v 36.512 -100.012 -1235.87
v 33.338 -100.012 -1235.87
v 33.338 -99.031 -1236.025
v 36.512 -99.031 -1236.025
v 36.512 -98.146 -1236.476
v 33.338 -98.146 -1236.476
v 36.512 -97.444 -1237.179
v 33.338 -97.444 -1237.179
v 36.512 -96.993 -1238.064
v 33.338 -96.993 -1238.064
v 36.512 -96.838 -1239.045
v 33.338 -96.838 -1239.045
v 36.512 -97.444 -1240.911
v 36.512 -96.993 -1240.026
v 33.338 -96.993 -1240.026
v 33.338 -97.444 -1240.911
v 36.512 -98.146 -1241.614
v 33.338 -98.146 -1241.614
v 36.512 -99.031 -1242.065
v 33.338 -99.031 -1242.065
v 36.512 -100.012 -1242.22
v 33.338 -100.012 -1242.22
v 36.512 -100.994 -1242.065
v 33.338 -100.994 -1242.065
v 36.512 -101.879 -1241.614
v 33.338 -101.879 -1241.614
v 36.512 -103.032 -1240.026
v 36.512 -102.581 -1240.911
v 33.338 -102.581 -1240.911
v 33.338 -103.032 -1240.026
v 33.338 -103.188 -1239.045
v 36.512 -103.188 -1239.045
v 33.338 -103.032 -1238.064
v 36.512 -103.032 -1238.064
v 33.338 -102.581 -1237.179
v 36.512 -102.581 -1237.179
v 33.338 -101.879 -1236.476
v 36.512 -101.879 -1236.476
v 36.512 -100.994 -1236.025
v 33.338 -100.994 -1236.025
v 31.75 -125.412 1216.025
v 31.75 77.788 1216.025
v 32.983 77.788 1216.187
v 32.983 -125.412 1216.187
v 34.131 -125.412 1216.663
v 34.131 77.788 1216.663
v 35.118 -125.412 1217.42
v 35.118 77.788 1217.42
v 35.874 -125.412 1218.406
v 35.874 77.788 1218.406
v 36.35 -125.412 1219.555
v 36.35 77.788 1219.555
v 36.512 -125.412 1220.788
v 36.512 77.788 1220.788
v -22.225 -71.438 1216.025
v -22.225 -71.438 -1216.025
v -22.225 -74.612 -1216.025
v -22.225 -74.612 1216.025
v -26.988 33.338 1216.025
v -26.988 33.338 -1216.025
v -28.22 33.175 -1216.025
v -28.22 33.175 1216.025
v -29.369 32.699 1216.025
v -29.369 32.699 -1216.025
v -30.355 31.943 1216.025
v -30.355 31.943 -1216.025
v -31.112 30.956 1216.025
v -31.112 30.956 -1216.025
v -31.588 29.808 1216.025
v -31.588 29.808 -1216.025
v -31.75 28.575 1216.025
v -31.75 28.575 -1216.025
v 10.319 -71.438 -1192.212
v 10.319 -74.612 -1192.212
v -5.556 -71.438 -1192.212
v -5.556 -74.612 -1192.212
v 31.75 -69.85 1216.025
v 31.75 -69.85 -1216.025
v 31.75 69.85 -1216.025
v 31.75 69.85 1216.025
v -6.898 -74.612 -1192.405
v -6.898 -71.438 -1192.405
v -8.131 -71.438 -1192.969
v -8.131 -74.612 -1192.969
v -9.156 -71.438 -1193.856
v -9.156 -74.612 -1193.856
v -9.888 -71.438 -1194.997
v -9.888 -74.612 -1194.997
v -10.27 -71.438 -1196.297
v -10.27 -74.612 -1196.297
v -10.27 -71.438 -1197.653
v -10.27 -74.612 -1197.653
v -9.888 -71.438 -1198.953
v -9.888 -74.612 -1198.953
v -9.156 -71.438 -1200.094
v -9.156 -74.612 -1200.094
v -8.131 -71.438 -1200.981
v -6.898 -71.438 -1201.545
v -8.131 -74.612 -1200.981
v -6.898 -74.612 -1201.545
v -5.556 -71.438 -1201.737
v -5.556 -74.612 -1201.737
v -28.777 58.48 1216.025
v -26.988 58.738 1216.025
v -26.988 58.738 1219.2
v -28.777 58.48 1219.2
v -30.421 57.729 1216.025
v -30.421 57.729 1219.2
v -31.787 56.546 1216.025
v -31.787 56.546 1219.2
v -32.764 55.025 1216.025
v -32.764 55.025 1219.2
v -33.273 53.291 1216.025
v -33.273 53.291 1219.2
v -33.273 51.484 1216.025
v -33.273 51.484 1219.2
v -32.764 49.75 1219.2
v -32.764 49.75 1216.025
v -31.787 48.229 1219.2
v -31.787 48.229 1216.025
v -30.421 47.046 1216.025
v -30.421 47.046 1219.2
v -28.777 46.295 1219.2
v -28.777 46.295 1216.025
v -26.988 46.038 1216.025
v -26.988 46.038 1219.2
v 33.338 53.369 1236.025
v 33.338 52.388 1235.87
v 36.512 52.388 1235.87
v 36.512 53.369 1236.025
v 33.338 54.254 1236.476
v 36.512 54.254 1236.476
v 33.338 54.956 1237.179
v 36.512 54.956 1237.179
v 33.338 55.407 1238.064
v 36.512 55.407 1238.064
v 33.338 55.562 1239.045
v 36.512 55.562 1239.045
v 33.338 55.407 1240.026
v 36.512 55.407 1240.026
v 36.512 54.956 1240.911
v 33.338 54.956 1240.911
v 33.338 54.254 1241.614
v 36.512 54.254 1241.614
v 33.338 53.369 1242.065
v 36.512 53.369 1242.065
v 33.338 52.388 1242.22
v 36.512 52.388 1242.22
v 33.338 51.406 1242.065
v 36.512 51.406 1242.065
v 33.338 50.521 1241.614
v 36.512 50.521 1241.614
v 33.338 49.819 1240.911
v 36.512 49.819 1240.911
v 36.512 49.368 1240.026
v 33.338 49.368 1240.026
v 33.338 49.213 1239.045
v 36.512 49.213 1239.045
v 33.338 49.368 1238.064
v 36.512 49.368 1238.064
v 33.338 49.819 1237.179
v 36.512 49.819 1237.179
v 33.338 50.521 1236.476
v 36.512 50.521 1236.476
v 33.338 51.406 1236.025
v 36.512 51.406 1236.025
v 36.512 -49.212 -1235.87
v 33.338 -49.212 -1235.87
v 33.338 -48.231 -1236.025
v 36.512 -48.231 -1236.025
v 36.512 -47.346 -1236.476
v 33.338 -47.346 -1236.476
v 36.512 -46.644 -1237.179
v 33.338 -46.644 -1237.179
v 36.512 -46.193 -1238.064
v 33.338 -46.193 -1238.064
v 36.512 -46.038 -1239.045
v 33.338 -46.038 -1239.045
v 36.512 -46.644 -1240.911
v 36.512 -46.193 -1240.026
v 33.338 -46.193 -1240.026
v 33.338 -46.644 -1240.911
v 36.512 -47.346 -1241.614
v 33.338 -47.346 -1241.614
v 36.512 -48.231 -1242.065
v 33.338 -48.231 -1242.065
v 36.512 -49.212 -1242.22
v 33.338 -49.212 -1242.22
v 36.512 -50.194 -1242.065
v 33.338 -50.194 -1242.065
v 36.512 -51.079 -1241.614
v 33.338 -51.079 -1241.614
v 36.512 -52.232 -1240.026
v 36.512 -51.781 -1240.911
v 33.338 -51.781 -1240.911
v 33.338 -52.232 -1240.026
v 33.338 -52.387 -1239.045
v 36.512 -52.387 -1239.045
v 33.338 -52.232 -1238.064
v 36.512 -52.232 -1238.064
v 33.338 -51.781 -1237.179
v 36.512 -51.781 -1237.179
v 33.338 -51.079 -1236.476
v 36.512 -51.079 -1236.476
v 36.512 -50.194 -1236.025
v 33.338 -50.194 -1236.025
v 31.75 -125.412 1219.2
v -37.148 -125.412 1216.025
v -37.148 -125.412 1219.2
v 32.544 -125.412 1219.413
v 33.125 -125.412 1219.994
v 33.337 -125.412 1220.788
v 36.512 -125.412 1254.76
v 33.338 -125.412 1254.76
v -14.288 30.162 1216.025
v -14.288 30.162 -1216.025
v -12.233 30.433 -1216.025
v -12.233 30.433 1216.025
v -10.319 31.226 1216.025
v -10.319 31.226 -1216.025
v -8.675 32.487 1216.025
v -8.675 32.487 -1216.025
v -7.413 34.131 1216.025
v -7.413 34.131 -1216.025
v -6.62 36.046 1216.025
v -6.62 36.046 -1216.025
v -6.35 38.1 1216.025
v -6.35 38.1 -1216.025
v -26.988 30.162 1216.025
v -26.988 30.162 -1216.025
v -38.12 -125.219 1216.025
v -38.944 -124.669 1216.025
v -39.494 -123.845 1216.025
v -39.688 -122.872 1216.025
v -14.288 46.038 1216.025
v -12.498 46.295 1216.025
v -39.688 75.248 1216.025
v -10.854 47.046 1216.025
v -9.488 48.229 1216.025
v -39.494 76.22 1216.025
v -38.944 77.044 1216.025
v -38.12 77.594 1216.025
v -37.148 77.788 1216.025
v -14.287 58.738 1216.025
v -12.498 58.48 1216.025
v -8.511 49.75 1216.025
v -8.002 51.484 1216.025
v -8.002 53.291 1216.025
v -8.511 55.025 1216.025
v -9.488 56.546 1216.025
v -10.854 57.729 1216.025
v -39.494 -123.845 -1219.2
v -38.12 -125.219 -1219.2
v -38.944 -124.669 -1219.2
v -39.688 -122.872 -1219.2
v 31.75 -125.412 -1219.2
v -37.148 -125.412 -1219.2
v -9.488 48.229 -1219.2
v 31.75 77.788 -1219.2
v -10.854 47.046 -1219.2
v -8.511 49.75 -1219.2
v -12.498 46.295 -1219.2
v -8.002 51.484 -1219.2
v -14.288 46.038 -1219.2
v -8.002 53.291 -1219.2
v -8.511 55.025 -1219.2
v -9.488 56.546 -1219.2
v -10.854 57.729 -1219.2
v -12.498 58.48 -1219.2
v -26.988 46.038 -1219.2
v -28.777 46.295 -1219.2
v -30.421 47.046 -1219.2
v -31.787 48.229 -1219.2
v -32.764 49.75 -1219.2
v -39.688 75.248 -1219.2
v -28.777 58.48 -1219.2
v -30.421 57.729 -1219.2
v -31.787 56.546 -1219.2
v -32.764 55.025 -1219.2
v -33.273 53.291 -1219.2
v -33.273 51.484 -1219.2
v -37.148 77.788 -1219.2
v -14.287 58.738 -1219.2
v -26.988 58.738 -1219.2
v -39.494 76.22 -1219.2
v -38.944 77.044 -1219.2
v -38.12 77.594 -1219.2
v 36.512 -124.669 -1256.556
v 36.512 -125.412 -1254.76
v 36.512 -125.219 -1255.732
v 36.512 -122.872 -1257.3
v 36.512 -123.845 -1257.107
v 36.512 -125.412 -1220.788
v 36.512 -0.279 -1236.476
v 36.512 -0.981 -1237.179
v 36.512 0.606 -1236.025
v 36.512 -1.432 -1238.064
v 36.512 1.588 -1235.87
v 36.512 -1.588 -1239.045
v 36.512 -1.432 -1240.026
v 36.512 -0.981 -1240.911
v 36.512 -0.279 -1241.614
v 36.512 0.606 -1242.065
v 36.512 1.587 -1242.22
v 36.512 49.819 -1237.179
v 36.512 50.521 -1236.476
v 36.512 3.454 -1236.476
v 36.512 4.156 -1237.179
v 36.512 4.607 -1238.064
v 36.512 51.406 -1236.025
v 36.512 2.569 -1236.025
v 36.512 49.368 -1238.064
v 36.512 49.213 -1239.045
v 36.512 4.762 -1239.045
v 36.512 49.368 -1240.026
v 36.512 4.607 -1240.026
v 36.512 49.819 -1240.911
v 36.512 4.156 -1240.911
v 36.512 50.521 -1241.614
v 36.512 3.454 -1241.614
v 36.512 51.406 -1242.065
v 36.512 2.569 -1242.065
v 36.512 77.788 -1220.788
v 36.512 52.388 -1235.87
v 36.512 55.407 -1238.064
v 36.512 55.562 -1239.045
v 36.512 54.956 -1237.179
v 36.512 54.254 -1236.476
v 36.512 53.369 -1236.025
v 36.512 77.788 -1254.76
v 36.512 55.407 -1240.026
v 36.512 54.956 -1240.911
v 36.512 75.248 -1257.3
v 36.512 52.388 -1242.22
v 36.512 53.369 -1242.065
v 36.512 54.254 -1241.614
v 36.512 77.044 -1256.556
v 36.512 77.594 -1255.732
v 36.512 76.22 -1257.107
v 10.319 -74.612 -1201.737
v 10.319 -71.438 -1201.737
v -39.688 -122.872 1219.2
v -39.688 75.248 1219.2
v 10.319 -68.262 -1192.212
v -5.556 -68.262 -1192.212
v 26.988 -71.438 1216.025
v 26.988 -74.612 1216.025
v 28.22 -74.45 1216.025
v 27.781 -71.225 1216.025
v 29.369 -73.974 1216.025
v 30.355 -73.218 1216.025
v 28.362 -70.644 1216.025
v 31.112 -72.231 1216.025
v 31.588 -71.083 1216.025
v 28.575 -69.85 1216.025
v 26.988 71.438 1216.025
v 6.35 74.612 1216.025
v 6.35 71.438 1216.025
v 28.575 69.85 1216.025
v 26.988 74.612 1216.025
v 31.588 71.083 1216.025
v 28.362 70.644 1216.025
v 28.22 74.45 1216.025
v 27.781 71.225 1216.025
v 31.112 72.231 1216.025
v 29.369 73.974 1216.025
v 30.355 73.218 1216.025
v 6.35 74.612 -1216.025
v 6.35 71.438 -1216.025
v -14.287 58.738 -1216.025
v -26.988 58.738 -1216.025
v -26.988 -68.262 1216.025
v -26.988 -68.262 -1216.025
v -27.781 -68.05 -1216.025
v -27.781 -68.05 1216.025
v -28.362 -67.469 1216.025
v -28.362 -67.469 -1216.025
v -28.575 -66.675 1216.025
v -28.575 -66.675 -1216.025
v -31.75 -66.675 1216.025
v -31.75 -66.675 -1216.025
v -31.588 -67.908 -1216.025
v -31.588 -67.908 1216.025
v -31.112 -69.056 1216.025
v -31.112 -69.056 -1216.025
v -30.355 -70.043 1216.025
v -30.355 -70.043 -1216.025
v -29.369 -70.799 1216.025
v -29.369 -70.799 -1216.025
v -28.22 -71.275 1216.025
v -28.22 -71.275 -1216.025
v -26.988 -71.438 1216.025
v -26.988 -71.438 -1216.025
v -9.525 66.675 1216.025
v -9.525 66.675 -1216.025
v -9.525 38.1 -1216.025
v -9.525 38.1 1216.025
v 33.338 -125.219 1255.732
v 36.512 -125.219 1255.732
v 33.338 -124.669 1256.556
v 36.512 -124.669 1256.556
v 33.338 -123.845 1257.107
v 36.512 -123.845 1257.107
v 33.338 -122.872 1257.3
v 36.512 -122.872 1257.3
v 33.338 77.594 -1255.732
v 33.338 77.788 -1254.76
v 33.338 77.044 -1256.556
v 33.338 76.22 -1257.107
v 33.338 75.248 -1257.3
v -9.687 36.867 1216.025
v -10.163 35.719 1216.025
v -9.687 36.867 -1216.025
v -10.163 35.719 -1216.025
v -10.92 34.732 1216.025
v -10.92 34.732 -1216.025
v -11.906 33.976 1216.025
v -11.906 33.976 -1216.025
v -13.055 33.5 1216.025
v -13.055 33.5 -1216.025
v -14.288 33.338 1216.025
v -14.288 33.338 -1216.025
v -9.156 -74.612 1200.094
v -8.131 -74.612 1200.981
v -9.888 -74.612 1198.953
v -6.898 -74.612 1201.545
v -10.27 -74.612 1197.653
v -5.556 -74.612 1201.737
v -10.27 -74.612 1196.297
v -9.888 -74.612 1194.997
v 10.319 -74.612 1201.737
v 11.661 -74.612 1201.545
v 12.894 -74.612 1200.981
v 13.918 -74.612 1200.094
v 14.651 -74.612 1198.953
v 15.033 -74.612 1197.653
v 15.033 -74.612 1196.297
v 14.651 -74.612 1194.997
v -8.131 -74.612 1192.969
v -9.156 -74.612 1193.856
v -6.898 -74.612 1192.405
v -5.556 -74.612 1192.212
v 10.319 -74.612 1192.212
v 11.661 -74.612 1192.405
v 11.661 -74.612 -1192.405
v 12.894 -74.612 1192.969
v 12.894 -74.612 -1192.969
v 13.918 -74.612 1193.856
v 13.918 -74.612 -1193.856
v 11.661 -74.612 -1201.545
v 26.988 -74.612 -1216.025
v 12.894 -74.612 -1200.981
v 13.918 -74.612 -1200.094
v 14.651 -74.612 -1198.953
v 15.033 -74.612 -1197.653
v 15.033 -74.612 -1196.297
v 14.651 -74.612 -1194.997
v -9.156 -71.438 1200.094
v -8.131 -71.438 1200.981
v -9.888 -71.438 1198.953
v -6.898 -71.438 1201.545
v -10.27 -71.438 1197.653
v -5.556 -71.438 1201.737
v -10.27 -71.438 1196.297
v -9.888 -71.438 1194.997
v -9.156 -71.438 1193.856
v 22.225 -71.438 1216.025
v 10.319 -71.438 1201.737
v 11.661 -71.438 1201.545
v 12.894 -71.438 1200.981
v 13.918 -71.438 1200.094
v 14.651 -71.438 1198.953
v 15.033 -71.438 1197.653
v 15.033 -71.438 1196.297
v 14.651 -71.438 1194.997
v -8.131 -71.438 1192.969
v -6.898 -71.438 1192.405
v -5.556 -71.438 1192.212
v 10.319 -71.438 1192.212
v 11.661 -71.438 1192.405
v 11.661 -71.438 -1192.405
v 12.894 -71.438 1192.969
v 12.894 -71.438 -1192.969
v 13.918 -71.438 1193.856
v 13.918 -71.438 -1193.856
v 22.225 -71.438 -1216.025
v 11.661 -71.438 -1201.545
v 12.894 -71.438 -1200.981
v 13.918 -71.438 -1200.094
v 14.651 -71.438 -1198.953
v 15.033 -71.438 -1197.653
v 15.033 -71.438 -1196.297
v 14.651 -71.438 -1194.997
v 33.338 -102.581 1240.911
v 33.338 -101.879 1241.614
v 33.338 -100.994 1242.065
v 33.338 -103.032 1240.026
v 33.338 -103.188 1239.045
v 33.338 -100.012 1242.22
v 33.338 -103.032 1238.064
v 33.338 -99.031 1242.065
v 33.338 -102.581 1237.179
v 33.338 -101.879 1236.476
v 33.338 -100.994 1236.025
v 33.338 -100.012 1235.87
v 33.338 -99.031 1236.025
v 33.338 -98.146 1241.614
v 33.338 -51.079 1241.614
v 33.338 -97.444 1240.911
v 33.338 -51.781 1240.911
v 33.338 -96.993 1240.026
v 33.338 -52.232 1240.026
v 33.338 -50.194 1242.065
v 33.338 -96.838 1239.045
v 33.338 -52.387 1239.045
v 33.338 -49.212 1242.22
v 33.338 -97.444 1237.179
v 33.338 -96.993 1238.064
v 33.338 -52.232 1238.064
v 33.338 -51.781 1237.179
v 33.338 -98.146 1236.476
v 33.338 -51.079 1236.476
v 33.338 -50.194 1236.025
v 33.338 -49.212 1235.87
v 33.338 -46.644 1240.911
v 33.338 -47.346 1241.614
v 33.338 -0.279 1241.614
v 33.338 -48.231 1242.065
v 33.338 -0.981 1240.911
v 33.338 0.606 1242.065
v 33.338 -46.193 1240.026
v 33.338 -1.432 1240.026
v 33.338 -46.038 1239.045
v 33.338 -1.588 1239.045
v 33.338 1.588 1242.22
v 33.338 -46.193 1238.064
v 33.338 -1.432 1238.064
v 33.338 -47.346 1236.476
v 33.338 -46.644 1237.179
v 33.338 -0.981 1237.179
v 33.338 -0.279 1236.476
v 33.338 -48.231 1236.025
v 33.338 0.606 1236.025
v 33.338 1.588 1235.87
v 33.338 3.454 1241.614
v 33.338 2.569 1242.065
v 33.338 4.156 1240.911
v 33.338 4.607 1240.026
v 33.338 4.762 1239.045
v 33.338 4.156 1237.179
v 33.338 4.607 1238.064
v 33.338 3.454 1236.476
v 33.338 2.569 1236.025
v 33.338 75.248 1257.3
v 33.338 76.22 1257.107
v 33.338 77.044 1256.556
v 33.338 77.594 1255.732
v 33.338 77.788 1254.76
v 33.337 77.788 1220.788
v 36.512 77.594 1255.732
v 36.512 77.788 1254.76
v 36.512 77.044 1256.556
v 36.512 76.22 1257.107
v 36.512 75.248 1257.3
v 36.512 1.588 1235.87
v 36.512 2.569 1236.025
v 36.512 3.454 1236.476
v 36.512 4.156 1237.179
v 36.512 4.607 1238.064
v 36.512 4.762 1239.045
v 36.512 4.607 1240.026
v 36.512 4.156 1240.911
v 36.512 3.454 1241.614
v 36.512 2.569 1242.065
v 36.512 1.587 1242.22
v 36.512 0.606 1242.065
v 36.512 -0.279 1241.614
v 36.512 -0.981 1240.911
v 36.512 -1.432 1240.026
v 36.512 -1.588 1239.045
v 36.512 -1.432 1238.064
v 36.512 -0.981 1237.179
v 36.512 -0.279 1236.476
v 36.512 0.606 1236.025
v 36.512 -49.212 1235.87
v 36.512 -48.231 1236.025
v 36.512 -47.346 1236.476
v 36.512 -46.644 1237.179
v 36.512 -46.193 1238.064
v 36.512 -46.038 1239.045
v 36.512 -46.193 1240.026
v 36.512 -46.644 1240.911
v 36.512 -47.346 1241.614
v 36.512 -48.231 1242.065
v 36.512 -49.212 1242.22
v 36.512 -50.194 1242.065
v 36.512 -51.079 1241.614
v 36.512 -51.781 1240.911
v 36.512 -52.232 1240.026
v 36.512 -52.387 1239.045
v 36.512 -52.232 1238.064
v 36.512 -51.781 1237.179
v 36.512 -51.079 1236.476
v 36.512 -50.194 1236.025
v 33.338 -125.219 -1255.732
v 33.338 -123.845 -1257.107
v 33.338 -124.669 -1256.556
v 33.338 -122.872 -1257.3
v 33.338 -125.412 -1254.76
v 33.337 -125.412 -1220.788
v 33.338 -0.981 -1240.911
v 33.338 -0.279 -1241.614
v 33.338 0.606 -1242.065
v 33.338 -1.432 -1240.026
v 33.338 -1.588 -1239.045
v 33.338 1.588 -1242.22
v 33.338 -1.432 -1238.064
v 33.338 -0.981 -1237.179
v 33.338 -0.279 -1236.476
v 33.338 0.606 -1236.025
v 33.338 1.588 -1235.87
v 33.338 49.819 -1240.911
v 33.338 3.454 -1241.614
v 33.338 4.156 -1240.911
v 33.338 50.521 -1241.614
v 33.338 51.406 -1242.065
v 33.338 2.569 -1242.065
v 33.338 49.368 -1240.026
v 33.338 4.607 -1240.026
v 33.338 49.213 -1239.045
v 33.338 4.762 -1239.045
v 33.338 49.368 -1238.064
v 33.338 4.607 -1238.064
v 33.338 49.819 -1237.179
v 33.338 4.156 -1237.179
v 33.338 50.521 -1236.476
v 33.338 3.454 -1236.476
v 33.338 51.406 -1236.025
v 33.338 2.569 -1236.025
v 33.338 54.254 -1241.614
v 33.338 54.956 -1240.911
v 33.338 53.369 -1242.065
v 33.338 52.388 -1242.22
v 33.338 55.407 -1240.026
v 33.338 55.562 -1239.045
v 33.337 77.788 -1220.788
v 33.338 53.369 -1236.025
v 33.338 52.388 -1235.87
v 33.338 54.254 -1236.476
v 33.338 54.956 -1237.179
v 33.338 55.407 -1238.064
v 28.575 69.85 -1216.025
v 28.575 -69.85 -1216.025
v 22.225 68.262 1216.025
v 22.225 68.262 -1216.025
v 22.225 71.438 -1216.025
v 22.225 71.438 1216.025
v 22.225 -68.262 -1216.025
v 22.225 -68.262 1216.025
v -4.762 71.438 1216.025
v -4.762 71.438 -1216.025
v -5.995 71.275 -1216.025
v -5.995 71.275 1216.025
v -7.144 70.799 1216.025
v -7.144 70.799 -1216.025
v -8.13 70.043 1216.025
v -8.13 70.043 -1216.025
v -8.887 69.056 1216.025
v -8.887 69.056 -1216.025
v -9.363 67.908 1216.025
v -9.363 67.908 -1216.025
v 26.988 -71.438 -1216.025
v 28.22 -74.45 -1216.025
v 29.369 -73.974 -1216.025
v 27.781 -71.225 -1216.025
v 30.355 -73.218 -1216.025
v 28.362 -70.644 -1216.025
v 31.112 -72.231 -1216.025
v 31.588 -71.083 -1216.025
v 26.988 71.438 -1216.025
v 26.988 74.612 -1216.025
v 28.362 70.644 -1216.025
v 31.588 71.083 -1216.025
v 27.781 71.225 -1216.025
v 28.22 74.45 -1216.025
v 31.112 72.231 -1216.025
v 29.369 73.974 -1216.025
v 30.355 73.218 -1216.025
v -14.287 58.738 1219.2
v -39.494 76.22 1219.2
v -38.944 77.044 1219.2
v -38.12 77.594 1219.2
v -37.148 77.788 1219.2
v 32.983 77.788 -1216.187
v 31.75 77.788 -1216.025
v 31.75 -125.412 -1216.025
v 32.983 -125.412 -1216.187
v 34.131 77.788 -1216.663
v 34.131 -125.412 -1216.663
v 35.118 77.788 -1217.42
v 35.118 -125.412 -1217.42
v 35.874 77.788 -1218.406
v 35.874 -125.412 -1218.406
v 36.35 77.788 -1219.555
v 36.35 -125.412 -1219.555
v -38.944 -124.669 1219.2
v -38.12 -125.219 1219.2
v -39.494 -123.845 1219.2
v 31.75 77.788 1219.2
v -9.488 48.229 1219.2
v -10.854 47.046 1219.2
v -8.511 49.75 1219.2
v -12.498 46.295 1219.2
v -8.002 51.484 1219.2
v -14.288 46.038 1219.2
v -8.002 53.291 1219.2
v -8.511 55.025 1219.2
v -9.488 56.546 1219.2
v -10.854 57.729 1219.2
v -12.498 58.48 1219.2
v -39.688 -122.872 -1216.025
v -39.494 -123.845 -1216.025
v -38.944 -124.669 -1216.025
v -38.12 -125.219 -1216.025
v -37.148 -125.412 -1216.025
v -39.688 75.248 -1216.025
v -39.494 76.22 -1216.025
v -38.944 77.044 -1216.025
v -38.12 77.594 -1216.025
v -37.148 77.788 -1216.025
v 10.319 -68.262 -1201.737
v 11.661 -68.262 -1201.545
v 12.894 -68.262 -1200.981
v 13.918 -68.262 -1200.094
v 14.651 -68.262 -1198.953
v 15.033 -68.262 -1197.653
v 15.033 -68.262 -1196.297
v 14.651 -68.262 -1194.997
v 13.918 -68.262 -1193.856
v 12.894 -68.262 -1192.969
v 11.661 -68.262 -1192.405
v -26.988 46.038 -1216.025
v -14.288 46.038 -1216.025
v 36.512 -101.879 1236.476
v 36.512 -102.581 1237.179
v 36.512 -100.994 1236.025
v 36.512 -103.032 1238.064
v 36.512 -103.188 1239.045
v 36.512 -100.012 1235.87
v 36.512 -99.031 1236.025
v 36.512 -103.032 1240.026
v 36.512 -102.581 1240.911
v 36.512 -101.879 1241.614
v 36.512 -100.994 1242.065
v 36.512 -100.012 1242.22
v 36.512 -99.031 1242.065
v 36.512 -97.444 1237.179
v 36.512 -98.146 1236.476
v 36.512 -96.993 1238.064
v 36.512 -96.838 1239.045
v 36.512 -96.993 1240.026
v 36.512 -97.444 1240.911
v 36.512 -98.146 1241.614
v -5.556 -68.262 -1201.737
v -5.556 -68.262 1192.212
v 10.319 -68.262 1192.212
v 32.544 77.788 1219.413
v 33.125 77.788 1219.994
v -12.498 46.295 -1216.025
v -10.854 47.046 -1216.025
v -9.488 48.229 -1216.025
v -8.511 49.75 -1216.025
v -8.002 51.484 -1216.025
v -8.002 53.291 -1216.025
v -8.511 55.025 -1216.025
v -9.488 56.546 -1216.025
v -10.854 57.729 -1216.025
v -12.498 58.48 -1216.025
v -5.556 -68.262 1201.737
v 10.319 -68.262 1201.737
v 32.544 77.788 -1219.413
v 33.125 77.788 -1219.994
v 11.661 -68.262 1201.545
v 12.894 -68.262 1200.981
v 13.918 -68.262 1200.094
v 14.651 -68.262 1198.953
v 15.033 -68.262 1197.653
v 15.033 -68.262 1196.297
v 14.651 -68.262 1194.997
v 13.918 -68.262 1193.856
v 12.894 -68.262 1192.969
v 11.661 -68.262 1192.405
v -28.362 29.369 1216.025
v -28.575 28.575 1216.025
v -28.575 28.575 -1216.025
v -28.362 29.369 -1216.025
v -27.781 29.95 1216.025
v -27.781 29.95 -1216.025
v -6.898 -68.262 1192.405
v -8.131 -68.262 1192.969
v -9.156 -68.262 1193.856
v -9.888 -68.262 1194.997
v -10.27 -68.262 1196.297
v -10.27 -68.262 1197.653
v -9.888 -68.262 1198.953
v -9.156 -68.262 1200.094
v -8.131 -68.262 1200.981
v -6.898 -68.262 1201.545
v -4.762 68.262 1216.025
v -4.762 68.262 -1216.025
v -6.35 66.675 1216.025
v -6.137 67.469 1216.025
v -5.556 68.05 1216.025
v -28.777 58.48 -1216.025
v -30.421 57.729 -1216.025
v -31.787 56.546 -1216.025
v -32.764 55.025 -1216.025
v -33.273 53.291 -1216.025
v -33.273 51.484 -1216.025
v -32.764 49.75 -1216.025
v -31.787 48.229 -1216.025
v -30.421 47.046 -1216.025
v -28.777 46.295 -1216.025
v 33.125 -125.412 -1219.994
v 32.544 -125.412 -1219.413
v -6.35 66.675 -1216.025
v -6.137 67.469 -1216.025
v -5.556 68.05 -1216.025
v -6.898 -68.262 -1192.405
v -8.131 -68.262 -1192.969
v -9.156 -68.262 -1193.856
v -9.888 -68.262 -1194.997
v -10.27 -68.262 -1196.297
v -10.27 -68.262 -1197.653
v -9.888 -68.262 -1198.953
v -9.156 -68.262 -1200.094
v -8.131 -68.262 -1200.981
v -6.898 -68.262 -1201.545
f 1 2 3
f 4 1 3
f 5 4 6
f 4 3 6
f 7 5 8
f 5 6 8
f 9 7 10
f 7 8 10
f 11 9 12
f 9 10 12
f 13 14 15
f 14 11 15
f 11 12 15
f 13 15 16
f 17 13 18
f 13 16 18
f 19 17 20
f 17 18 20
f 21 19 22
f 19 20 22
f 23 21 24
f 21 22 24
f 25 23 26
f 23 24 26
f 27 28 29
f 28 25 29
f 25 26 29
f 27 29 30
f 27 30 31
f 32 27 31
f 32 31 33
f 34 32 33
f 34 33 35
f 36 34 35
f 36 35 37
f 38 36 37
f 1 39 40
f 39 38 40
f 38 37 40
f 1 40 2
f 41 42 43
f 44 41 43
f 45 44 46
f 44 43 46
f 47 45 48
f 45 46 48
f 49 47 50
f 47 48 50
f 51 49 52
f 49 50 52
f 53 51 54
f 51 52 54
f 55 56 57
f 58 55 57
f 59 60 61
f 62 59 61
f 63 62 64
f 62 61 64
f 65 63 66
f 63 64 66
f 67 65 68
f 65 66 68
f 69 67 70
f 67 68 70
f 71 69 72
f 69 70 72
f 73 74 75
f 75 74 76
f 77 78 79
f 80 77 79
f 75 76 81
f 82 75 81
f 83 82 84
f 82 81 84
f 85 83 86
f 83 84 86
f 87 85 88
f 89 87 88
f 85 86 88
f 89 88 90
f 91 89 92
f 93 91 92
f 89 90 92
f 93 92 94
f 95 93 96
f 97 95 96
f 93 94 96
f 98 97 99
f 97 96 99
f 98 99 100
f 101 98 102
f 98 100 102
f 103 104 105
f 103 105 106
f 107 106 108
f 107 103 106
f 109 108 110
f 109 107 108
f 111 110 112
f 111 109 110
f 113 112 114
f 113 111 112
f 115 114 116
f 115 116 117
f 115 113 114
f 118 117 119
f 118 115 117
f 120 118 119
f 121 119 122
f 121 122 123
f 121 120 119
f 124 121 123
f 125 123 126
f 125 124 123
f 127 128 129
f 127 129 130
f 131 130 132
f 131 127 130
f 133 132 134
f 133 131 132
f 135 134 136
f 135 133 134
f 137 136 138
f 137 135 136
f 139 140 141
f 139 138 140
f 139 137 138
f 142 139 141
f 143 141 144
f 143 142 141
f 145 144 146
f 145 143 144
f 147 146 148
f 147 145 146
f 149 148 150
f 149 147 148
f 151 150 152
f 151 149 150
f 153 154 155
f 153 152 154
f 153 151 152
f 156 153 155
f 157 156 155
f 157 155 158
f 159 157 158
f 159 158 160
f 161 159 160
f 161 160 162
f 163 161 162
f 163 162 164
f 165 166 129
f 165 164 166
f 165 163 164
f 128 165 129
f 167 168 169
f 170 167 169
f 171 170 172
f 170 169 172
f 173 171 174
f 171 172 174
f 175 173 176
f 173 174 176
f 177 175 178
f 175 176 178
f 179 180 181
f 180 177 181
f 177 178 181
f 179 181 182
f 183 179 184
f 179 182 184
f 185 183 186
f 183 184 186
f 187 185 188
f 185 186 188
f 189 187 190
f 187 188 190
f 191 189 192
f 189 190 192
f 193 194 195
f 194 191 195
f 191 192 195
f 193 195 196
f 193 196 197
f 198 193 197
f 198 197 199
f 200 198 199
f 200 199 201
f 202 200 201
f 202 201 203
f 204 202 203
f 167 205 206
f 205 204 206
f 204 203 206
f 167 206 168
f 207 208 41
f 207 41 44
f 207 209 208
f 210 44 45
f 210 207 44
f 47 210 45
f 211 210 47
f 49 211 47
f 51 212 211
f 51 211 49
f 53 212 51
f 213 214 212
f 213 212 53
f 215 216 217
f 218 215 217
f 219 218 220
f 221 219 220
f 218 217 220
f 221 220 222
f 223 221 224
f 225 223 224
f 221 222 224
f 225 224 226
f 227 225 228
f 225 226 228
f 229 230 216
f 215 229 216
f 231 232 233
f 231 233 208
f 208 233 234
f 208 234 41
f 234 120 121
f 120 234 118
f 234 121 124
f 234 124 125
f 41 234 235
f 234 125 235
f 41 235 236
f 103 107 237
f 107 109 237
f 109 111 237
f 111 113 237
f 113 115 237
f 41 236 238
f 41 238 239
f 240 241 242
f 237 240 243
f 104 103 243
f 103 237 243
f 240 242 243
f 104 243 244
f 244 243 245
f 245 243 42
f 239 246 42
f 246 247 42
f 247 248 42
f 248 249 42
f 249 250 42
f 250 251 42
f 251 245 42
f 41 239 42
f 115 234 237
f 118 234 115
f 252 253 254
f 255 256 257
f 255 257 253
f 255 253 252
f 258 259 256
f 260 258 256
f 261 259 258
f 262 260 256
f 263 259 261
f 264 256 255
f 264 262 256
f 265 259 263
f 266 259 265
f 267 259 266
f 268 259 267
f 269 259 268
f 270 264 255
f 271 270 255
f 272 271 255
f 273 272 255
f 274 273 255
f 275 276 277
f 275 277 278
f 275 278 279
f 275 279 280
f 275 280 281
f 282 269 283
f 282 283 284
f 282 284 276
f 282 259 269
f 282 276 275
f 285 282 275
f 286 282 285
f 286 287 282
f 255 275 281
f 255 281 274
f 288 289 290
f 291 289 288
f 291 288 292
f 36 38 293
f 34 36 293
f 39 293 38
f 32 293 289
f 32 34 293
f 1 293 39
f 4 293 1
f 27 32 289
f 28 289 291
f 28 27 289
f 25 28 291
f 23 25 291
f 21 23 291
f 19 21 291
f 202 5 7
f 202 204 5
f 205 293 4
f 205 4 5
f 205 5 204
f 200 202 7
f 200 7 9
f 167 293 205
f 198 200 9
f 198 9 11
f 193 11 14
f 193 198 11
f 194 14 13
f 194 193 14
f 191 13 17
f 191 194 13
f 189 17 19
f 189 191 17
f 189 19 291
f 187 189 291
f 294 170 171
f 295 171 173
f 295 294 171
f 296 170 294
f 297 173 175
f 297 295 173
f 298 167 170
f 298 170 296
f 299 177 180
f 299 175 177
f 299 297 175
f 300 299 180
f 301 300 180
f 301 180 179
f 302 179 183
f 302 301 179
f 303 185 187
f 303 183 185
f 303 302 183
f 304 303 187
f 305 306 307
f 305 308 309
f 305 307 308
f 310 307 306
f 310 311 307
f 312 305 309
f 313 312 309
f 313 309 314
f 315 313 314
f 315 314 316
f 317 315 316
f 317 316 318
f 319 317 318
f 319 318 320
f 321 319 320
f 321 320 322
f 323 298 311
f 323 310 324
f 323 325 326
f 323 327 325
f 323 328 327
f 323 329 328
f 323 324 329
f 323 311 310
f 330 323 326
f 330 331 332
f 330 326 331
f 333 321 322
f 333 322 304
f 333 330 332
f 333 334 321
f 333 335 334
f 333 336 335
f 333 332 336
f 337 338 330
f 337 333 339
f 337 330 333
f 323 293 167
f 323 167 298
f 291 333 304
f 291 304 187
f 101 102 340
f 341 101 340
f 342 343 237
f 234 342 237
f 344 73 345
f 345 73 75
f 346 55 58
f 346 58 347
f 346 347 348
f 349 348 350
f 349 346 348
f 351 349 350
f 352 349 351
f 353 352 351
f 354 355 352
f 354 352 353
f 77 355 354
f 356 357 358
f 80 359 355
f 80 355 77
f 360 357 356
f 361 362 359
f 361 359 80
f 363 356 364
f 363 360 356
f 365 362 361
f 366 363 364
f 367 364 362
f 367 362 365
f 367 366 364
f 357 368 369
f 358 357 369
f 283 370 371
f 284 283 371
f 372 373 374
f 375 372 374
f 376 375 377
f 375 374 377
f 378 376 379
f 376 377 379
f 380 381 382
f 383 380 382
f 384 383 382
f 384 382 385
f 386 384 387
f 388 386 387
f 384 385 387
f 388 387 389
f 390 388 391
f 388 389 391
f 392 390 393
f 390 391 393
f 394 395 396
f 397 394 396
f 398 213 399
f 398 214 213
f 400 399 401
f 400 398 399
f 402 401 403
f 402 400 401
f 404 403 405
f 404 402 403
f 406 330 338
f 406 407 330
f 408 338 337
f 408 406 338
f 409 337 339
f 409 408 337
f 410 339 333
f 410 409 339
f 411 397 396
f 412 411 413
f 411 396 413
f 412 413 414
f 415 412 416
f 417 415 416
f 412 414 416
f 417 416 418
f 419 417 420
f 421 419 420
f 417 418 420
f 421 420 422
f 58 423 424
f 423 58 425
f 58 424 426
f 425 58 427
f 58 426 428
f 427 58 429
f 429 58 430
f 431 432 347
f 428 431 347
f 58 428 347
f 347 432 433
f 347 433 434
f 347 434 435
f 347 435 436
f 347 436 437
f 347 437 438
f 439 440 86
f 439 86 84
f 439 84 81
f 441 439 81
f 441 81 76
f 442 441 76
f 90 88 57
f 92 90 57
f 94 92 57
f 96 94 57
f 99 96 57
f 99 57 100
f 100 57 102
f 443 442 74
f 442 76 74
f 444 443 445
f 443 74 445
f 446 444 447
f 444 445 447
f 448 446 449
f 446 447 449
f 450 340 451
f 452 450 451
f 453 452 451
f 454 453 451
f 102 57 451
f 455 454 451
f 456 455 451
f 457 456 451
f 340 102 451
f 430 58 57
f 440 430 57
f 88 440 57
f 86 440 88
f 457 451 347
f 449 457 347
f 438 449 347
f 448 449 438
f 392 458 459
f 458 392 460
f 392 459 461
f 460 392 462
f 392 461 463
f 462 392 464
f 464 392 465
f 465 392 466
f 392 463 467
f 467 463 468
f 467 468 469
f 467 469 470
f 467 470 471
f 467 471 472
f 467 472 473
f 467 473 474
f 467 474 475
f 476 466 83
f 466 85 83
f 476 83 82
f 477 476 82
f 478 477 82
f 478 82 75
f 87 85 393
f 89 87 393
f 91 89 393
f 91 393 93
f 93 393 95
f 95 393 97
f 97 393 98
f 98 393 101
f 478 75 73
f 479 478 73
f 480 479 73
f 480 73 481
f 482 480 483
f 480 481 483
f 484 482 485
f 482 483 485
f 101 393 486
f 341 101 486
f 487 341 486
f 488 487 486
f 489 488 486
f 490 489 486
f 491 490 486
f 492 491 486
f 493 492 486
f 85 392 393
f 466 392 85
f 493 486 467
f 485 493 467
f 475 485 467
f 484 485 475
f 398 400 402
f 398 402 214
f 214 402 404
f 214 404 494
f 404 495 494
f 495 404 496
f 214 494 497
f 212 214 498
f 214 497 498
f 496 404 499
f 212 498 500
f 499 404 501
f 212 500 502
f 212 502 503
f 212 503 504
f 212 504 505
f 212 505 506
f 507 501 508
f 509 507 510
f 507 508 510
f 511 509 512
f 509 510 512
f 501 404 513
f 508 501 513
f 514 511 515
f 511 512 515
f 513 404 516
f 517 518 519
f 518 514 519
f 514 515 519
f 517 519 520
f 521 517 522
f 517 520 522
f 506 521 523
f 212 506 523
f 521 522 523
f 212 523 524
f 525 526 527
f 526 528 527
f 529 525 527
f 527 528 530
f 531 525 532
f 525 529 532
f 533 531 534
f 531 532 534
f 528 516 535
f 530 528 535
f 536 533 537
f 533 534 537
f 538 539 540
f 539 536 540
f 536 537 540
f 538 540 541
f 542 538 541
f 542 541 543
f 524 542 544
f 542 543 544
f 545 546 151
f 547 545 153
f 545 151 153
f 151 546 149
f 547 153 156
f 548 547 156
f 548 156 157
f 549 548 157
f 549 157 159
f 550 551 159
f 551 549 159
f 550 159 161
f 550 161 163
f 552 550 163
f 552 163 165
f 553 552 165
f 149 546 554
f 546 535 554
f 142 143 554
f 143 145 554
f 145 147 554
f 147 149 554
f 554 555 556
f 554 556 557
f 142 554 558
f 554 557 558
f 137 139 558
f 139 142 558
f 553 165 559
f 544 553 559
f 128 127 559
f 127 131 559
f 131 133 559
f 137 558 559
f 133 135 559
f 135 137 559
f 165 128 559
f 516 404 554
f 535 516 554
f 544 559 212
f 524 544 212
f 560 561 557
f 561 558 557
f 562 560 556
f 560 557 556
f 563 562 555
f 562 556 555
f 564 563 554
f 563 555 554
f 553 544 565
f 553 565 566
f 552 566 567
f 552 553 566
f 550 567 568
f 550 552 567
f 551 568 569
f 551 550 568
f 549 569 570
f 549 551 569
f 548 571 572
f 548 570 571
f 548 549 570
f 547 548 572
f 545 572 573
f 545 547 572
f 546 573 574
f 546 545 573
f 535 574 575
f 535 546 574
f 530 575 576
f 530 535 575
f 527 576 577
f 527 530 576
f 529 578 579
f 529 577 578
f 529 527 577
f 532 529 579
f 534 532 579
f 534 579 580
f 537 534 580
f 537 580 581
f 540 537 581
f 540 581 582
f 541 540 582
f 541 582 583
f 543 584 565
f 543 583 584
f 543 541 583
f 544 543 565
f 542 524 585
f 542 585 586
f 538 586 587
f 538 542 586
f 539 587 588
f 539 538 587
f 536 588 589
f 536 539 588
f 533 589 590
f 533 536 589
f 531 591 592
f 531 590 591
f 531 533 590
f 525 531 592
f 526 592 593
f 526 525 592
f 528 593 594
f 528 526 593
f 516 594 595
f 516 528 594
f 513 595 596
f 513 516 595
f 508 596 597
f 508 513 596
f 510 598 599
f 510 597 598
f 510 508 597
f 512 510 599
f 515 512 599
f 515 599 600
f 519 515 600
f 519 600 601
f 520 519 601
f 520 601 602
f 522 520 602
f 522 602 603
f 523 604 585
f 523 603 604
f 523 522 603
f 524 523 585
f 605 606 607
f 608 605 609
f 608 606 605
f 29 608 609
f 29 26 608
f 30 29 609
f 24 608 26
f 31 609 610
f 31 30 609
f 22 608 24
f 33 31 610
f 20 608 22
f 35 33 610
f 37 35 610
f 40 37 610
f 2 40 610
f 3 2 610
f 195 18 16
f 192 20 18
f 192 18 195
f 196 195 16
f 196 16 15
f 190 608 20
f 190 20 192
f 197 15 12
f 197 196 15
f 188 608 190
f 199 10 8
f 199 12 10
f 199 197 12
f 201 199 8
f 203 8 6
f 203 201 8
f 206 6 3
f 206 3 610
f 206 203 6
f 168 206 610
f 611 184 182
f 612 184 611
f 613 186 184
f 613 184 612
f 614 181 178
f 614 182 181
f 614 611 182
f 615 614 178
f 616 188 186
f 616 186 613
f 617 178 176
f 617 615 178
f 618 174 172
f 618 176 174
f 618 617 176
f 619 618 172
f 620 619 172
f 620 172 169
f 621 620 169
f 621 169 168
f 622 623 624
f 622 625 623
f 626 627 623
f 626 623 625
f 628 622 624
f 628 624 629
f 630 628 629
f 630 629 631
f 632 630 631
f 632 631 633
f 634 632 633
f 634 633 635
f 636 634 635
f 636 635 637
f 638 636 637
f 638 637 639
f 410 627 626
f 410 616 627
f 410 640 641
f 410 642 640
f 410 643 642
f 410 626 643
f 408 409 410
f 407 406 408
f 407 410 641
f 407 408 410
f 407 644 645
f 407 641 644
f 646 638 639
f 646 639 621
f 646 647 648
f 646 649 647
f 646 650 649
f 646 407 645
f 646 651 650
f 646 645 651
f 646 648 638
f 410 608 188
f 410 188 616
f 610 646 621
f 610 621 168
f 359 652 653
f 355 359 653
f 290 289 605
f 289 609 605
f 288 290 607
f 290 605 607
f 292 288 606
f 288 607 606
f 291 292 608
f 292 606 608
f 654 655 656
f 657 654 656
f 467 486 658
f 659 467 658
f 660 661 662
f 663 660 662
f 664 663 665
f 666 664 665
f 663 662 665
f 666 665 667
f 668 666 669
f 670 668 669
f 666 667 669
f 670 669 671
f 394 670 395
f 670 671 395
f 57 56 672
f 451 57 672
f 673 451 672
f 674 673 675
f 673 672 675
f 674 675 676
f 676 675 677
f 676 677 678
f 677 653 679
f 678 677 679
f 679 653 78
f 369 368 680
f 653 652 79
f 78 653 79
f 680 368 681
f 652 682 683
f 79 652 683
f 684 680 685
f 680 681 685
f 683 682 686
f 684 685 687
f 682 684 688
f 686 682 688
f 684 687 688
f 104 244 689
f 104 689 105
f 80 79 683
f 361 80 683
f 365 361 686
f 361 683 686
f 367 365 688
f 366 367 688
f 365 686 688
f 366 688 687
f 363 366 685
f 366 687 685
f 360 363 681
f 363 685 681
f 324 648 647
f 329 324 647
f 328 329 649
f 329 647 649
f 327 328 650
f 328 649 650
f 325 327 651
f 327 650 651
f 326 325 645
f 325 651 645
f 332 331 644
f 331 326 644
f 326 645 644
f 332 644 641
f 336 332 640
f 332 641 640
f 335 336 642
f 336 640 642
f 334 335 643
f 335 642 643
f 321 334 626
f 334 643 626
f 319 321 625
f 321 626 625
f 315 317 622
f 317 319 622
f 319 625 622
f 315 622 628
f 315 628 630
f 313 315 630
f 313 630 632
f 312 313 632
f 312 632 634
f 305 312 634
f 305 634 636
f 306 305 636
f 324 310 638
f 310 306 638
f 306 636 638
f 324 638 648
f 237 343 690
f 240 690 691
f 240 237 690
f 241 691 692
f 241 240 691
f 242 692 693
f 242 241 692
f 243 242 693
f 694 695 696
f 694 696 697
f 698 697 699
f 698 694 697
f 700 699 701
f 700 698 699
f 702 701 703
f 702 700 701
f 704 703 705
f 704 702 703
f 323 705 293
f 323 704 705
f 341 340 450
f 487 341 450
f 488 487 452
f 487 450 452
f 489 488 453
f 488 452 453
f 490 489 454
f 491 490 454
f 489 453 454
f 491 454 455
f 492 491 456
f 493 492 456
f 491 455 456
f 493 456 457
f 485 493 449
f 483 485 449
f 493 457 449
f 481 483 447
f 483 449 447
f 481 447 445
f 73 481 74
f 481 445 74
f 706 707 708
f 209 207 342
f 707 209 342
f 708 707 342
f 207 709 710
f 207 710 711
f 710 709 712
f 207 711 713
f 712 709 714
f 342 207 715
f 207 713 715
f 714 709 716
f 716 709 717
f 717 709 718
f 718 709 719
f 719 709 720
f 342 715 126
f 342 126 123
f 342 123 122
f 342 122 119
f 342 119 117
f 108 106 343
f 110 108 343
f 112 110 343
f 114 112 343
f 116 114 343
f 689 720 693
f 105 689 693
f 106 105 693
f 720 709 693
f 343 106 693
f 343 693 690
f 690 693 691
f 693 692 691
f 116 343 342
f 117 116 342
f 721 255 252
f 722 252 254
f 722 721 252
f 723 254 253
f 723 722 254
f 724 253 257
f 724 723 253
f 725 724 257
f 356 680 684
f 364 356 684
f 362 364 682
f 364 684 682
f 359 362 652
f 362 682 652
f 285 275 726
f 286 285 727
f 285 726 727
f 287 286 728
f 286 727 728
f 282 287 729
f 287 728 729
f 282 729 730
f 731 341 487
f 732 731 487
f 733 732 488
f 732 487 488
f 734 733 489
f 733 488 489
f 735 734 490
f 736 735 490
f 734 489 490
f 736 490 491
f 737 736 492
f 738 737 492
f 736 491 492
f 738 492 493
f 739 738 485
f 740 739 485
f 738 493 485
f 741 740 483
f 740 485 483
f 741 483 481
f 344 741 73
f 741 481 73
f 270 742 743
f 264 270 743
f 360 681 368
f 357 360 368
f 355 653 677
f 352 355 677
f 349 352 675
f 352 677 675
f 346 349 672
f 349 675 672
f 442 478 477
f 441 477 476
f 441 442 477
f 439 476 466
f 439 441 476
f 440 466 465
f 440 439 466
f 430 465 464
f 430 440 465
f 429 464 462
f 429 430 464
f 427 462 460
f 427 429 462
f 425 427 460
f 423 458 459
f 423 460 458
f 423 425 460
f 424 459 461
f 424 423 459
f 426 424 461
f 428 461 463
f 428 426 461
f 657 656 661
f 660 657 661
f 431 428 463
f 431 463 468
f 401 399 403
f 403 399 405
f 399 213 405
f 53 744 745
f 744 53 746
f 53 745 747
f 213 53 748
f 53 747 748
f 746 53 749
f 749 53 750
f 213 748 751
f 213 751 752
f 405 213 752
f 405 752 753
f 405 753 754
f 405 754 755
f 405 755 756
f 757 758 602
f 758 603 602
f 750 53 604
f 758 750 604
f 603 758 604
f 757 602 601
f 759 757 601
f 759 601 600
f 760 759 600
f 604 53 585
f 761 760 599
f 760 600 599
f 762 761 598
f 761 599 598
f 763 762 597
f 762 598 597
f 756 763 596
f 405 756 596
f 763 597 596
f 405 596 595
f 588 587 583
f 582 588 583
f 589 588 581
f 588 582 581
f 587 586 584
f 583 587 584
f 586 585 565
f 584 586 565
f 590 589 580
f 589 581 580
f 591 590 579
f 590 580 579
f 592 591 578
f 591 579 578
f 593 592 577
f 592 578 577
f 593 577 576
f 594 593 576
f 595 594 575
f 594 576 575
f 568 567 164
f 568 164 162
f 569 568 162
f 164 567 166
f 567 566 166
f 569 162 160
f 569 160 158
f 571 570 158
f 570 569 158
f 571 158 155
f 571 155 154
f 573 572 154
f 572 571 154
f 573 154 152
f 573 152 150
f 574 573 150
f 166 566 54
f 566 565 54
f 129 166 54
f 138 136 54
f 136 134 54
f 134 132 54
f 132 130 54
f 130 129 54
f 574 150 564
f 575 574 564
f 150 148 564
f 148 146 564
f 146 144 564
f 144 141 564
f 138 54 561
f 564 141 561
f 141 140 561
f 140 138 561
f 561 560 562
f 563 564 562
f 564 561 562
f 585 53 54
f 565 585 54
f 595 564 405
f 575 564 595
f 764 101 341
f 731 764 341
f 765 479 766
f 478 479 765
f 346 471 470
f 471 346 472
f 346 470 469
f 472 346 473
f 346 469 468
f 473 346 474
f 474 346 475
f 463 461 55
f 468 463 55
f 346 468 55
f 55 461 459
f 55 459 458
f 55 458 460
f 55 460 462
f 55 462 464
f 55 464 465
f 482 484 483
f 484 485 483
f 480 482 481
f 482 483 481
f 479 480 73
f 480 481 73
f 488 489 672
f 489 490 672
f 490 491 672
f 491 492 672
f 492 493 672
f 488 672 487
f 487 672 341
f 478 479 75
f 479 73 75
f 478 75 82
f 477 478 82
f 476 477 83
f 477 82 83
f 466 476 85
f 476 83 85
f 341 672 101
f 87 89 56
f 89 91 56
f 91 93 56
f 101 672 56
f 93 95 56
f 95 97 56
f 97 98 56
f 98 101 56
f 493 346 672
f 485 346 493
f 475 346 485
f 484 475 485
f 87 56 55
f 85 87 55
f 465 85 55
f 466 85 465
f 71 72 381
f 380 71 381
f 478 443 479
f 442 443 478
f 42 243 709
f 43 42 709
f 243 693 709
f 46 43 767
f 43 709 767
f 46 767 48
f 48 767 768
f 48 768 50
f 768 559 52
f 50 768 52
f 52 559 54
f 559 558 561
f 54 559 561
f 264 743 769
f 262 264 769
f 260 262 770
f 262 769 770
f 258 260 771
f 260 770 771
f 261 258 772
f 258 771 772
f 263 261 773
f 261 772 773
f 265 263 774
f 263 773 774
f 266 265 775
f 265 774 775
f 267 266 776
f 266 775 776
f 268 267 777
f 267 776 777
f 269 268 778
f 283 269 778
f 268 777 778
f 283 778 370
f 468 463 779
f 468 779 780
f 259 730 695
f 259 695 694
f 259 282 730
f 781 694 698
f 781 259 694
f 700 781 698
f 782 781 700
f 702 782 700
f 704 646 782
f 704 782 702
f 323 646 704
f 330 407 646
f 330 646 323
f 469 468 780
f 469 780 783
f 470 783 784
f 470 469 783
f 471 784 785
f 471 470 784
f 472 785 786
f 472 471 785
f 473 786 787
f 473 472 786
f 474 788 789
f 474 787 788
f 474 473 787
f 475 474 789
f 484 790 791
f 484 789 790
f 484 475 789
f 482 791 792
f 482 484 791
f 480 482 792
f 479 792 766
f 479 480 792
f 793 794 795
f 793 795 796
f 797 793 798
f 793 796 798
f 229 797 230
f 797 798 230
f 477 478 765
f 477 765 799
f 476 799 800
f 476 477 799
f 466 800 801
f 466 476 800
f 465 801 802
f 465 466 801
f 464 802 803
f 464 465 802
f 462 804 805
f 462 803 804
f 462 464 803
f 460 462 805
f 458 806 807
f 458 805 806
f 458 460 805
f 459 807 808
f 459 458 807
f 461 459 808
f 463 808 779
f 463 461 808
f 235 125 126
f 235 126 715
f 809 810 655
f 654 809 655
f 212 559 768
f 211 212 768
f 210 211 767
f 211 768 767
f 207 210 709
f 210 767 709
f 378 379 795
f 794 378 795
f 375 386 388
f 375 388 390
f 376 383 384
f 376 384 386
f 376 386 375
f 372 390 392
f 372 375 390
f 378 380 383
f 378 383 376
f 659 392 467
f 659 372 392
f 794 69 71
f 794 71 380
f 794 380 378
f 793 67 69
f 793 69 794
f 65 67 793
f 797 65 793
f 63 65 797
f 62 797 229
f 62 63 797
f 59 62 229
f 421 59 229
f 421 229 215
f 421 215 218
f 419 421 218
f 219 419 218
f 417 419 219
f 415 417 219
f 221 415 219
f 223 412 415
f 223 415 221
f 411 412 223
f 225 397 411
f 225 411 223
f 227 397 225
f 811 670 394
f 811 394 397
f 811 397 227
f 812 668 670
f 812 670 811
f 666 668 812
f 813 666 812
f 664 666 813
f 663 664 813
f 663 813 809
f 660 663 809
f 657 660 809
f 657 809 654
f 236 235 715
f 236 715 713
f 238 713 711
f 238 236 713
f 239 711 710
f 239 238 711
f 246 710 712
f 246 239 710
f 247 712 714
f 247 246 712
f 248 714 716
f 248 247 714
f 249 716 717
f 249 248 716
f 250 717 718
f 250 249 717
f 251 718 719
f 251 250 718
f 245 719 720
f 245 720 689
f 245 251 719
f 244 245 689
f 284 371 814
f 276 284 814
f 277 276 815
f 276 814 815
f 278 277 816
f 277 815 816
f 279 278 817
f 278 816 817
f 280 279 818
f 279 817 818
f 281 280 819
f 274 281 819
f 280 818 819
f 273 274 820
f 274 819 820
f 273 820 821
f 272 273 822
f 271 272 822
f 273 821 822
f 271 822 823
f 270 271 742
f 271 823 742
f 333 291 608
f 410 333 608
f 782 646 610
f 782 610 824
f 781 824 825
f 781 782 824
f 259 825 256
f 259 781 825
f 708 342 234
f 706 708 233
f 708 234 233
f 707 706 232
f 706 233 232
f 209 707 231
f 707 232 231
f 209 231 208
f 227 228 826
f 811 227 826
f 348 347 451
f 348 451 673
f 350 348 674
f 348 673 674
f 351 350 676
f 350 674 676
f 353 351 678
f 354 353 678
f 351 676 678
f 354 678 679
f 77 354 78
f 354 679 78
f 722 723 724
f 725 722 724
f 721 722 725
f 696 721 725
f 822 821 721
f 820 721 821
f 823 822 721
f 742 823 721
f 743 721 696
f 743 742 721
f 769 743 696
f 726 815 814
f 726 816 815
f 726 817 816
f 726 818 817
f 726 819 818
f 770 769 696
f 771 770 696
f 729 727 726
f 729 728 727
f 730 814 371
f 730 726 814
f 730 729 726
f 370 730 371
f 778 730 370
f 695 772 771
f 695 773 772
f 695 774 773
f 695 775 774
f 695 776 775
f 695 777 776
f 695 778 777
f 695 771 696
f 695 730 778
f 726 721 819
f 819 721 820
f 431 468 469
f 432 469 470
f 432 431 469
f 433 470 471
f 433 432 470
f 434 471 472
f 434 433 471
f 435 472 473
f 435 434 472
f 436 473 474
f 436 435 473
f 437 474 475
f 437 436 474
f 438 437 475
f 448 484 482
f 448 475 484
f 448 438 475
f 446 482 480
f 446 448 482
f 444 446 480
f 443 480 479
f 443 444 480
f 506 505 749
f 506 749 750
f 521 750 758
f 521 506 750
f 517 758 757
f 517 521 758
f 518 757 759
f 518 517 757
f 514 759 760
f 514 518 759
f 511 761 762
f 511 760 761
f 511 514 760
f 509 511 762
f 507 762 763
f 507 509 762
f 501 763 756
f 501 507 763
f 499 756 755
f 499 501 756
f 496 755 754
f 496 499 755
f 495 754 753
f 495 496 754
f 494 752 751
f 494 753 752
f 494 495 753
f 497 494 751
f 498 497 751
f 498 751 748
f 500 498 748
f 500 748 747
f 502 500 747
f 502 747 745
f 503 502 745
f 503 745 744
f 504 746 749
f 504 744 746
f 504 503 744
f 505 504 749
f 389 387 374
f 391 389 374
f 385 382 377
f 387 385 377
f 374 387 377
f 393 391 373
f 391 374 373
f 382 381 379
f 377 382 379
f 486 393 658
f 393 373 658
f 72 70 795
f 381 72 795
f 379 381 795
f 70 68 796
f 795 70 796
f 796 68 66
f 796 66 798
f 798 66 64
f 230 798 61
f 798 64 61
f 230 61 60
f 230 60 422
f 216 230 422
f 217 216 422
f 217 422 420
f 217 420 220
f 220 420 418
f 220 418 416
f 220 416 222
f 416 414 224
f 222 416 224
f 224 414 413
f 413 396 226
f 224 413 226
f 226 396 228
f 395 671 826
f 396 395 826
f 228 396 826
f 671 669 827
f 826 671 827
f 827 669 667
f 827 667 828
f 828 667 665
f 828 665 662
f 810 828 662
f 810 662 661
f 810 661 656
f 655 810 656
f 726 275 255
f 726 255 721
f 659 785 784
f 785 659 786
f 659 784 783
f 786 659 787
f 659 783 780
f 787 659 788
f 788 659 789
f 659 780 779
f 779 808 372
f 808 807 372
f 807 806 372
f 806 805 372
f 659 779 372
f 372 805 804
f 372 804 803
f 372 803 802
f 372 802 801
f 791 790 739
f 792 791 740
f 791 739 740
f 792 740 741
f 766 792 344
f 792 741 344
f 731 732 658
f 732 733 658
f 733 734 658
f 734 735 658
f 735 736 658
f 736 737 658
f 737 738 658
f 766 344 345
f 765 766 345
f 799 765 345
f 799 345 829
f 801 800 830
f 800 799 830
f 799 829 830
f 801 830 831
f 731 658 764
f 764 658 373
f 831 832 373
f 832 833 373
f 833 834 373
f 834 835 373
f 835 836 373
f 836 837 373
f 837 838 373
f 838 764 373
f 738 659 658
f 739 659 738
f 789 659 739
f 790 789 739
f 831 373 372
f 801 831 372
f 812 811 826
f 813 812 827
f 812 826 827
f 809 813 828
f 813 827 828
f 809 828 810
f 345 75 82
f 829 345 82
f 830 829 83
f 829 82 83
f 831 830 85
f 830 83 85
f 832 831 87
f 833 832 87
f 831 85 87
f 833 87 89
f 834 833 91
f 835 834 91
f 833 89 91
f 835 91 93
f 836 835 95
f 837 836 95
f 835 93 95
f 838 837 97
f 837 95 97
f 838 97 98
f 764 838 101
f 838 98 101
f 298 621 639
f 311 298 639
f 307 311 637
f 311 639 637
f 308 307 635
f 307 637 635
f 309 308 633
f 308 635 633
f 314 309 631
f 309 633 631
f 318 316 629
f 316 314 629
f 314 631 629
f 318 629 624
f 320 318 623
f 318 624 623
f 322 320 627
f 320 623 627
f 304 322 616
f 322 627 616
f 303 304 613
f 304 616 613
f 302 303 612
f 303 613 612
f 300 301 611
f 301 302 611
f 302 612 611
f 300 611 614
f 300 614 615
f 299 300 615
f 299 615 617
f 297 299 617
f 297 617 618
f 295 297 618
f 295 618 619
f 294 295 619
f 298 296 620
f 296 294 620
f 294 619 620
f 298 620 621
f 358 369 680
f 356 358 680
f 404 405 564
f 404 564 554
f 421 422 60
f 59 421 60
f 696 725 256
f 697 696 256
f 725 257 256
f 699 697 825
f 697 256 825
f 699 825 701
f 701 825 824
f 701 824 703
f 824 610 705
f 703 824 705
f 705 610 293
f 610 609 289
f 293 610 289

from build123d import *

# Parameters (mm, degrees)
BOSS_EXTRUDE1_DEPTH      = 1216.025
BOSS_EXTRUDE1_DEPTH_BACK = 1216.025
BOSS_EXTRUDE2_START      = -1216.025
BOSS_EXTRUDE2_DEPTH      = 2432.05
BOSS_EXTRUDE3_DEPTH      = 50.8
BOSS_EXTRUDE3_DEPTH_BACK = 152.4
SKETCH5_R                = 3.175
CUT_EXTRUDE1_DEPTH       = 1266.647753437
CUT_EXTRUDE2_DEPTH       = 3.175
CUT_EXTRUDE3_DEPTH       = 9.525
FILLET1_R                = 2.54


with BuildPart() as part:
    # Sketch1 → Boss-Extrude1 (new, two sides: drawn at the far end of the back side and taken through both)
    with BuildSketch(Plane.XY.offset(-BOSS_EXTRUDE1_DEPTH_BACK)):
        with BuildLine():
            Line((6.35, 71.4375), (26.9875, 71.4375))
            ThreePointArc((26.9875, 71.4375), (28.110032015, 70.972532015), (28.575, 69.85))
            Line((28.575, 69.85), (28.575, -69.85))
            ThreePointArc((28.575, -69.85), (28.110032015, -70.972532015), (26.9875, -71.4375))
            Line((26.9875, -71.4375), (-22.225, -71.4375))
            Line((-22.225, -71.4375), (-22.225, -74.6125))
            Line((-22.225, -74.6125), (26.9875, -74.6125))
            ThreePointArc((26.9875, -74.6125), (30.355096045, -73.217596045), (31.75, -69.85))
            Line((31.75, -69.85), (31.75, 69.85))
            ThreePointArc((31.75, 69.85), (30.355096045, 73.217596045), (26.9875, 74.6125))
            Line((26.9875, 74.6125), (6.35, 74.6125))
            Line((6.35, 74.6125), (6.35, 71.4375))
        make_face()
    extrude(amount=BOSS_EXTRUDE1_DEPTH + BOSS_EXTRUDE1_DEPTH_BACK)


with BuildPart() as body_2:
    # Sketch2 → Boss-Extrude2 (new body)
    with BuildSketch(Plane.XY.offset(BOSS_EXTRUDE2_START)):
        with BuildLine():
            Line((22.225, 71.4375), (-4.7625, 71.4375))
            ThreePointArc((-4.7625, 71.4375), (-8.130096045, 70.042596045), (-9.525, 66.675))
            Line((-9.525, 66.675), (-9.525, 38.1))
            ThreePointArc((-9.525, 38.1), (-10.919903955, 34.732403955), (-14.2875, 33.3375))
            Line((-14.2875, 33.3375), (-26.9875, 33.3375))
            ThreePointArc((-26.9875, 33.3375), (-30.355096045, 31.942596045), (-31.75, 28.575))
            Line((-31.75, 28.575), (-31.75, -66.675))
            ThreePointArc((-31.75, -66.675), (-30.355096045, -70.042596045), (-26.9875, -71.4375))
            Line((-26.9875, -71.4375), (22.225, -71.4375))
            Line((22.225, -71.4375), (22.225, -68.2625))
            Line((22.225, -68.2625), (-26.9875, -68.2625))
            ThreePointArc((-26.9875, -68.2625), (-28.110032015, -67.797532015), (-28.575, -66.675))
            Line((-28.575, -66.675), (-28.575, 28.575))
            ThreePointArc((-28.575, 28.575), (-28.110032015, 29.697532015), (-26.9875, 30.1625))
            Line((-26.9875, 30.1625), (-14.2875, 30.1625))
            ThreePointArc((-14.2875, 30.1625), (-8.674839924, 32.487339924), (-6.35, 38.1))
            Line((-6.35, 38.1), (-6.35, 66.675))
            ThreePointArc((-6.35, 66.675), (-5.885032015, 67.797532015), (-4.7625, 68.2625))
            Line((-4.7625, 68.2625), (22.225, 68.2625))
            Line((22.225, 68.2625), (22.225, 71.4375))
        make_face()
    extrude(amount=BOSS_EXTRUDE2_DEPTH)


with BuildPart() as body_3:
    # Sketch4 → Boss-Extrude3 (new, two sides: drawn at the far end of the back side and taken through both)
    with BuildSketch(Plane.XZ.offset(74.6125).offset(-BOSS_EXTRUDE3_DEPTH_BACK)):
        with BuildLine():
            Line((-39.6875, 1216.025), (31.75, 1216.025))
            ThreePointArc((31.75, 1216.025), (35.117596045, 1217.419903955), (36.5125, 1220.7875))
            Line((36.5125, 1220.7875), (36.5125, 1257.3))
            Line((36.5125, 1257.3), (33.3375, 1257.3))
            Line((33.3375, 1257.3), (33.3375, 1220.7875))
            ThreePointArc((33.3375, 1220.7875), (32.872532015, 1219.664967985), (31.75, 1219.2))
            Line((31.75, 1219.2), (-39.6875, 1219.2))
            Line((-39.6875, 1219.2), (-39.6875, 1216.025))
        make_face()
    extrude(amount=BOSS_EXTRUDE3_DEPTH + BOSS_EXTRUDE3_DEPTH_BACK)

    # Sketch5 → Cut-Extrude1 (cut, through all)
    with BuildSketch(Plane(origin=(33.3375, 0, 0), x_dir=(0, 0, -1), z_dir=(1, 0, 0))):
        with Locations((-1239.04502, 52.3875)):
            Circle(SKETCH5_R)
        with Locations((-1239.04502, 1.5875)):
            Circle(SKETCH5_R)
        with Locations((-1239.04502, -49.2125)):
            Circle(SKETCH5_R)
        with Locations((-1239.04502, -100.0125)):
            Circle(SKETCH5_R)
    extrude(amount=CUT_EXTRUDE1_DEPTH, mode=Mode.SUBTRACT)

    # Sketch9 → Cut-Extrude2 (cut)
    with BuildSketch(Plane(origin=(0, 0, 1216.025), x_dir=(-1, 0, 0), z_dir=(0, 0, -1))):
        with BuildLine():
            Line((14.2875, 58.7375), (26.9875, 58.7375))
            ThreePointArc((26.9875, 58.7375), (33.3375, 52.3875), (26.9875, 46.0375))
            Line((26.9875, 46.0375), (14.2875, 46.0375))
            ThreePointArc((14.2875, 46.0375), (7.9375, 52.3875), (14.2875, 58.7375))
        make_face()
    extrude(amount=-CUT_EXTRUDE2_DEPTH, mode=Mode.SUBTRACT)

    # Fillet1
    fillet1_edges = [body_3.edges().sort_by_distance(p)[0] for p in [
        (34.925, 77.7875, 1257.3),
        (-39.6875, -125.4125, 1217.6125),
        (34.925, -125.4125, 1257.3),
        (-39.6875, 77.7875, 1217.6125),
    ]]
    fillet(fillet1_edges, radius=FILLET1_R)


with BuildPart() as cut_extrude3_tool:
    # Sketch10 → Cut-Extrude3 (new body)
    with BuildSketch(Plane.XZ.offset(74.6125)):
        with BuildLine():
            Line((10.31875, 1192.2125), (-5.55625, 1192.2125))
            ThreePointArc((-5.55625, 1192.2125), (-10.31875, 1196.975), (-5.55625, 1201.7375))
            Line((-5.55625, 1201.7375), (10.31875, 1201.7375))
            ThreePointArc((10.31875, 1201.7375), (15.08125, 1196.975), (10.31875, 1192.2125))
        make_face()
    cut_extrude3 = extrude(amount=-CUT_EXTRUDE3_DEPTH)


with BuildPart() as part_1:
    add(part.part)

    # Cut-Extrude3: cut by cut_extrude3_tool
    add(cut_extrude3_tool.part, mode=Mode.SUBTRACT)


with BuildPart() as body_2_1:
    add(body_2.part)

    # Cut-Extrude3: cut by cut_extrude3_tool
    add(cut_extrude3_tool.part, mode=Mode.SUBTRACT)


with BuildPart() as mirror2_tool:
    # Mirror2: Cut-Extrude3 across plane
    add(cut_extrude3.mirror(Plane.XY))


with BuildPart() as part_2:
    add(part_1.part)

    # Mirror2: cut by mirror2_tool
    add(mirror2_tool.part, mode=Mode.SUBTRACT)


with BuildPart() as body_2_2:
    add(body_2_1.part)

    # Mirror2: cut by mirror2_tool
    add(mirror2_tool.part, mode=Mode.SUBTRACT)


with BuildPart() as body_4:
    # Mirror3: mirrored copy
    add(body_3.part.mirror(Plane.XY))


solid = Compound([body_3.part, part_2.part, body_2_2.part, body_4.part])
